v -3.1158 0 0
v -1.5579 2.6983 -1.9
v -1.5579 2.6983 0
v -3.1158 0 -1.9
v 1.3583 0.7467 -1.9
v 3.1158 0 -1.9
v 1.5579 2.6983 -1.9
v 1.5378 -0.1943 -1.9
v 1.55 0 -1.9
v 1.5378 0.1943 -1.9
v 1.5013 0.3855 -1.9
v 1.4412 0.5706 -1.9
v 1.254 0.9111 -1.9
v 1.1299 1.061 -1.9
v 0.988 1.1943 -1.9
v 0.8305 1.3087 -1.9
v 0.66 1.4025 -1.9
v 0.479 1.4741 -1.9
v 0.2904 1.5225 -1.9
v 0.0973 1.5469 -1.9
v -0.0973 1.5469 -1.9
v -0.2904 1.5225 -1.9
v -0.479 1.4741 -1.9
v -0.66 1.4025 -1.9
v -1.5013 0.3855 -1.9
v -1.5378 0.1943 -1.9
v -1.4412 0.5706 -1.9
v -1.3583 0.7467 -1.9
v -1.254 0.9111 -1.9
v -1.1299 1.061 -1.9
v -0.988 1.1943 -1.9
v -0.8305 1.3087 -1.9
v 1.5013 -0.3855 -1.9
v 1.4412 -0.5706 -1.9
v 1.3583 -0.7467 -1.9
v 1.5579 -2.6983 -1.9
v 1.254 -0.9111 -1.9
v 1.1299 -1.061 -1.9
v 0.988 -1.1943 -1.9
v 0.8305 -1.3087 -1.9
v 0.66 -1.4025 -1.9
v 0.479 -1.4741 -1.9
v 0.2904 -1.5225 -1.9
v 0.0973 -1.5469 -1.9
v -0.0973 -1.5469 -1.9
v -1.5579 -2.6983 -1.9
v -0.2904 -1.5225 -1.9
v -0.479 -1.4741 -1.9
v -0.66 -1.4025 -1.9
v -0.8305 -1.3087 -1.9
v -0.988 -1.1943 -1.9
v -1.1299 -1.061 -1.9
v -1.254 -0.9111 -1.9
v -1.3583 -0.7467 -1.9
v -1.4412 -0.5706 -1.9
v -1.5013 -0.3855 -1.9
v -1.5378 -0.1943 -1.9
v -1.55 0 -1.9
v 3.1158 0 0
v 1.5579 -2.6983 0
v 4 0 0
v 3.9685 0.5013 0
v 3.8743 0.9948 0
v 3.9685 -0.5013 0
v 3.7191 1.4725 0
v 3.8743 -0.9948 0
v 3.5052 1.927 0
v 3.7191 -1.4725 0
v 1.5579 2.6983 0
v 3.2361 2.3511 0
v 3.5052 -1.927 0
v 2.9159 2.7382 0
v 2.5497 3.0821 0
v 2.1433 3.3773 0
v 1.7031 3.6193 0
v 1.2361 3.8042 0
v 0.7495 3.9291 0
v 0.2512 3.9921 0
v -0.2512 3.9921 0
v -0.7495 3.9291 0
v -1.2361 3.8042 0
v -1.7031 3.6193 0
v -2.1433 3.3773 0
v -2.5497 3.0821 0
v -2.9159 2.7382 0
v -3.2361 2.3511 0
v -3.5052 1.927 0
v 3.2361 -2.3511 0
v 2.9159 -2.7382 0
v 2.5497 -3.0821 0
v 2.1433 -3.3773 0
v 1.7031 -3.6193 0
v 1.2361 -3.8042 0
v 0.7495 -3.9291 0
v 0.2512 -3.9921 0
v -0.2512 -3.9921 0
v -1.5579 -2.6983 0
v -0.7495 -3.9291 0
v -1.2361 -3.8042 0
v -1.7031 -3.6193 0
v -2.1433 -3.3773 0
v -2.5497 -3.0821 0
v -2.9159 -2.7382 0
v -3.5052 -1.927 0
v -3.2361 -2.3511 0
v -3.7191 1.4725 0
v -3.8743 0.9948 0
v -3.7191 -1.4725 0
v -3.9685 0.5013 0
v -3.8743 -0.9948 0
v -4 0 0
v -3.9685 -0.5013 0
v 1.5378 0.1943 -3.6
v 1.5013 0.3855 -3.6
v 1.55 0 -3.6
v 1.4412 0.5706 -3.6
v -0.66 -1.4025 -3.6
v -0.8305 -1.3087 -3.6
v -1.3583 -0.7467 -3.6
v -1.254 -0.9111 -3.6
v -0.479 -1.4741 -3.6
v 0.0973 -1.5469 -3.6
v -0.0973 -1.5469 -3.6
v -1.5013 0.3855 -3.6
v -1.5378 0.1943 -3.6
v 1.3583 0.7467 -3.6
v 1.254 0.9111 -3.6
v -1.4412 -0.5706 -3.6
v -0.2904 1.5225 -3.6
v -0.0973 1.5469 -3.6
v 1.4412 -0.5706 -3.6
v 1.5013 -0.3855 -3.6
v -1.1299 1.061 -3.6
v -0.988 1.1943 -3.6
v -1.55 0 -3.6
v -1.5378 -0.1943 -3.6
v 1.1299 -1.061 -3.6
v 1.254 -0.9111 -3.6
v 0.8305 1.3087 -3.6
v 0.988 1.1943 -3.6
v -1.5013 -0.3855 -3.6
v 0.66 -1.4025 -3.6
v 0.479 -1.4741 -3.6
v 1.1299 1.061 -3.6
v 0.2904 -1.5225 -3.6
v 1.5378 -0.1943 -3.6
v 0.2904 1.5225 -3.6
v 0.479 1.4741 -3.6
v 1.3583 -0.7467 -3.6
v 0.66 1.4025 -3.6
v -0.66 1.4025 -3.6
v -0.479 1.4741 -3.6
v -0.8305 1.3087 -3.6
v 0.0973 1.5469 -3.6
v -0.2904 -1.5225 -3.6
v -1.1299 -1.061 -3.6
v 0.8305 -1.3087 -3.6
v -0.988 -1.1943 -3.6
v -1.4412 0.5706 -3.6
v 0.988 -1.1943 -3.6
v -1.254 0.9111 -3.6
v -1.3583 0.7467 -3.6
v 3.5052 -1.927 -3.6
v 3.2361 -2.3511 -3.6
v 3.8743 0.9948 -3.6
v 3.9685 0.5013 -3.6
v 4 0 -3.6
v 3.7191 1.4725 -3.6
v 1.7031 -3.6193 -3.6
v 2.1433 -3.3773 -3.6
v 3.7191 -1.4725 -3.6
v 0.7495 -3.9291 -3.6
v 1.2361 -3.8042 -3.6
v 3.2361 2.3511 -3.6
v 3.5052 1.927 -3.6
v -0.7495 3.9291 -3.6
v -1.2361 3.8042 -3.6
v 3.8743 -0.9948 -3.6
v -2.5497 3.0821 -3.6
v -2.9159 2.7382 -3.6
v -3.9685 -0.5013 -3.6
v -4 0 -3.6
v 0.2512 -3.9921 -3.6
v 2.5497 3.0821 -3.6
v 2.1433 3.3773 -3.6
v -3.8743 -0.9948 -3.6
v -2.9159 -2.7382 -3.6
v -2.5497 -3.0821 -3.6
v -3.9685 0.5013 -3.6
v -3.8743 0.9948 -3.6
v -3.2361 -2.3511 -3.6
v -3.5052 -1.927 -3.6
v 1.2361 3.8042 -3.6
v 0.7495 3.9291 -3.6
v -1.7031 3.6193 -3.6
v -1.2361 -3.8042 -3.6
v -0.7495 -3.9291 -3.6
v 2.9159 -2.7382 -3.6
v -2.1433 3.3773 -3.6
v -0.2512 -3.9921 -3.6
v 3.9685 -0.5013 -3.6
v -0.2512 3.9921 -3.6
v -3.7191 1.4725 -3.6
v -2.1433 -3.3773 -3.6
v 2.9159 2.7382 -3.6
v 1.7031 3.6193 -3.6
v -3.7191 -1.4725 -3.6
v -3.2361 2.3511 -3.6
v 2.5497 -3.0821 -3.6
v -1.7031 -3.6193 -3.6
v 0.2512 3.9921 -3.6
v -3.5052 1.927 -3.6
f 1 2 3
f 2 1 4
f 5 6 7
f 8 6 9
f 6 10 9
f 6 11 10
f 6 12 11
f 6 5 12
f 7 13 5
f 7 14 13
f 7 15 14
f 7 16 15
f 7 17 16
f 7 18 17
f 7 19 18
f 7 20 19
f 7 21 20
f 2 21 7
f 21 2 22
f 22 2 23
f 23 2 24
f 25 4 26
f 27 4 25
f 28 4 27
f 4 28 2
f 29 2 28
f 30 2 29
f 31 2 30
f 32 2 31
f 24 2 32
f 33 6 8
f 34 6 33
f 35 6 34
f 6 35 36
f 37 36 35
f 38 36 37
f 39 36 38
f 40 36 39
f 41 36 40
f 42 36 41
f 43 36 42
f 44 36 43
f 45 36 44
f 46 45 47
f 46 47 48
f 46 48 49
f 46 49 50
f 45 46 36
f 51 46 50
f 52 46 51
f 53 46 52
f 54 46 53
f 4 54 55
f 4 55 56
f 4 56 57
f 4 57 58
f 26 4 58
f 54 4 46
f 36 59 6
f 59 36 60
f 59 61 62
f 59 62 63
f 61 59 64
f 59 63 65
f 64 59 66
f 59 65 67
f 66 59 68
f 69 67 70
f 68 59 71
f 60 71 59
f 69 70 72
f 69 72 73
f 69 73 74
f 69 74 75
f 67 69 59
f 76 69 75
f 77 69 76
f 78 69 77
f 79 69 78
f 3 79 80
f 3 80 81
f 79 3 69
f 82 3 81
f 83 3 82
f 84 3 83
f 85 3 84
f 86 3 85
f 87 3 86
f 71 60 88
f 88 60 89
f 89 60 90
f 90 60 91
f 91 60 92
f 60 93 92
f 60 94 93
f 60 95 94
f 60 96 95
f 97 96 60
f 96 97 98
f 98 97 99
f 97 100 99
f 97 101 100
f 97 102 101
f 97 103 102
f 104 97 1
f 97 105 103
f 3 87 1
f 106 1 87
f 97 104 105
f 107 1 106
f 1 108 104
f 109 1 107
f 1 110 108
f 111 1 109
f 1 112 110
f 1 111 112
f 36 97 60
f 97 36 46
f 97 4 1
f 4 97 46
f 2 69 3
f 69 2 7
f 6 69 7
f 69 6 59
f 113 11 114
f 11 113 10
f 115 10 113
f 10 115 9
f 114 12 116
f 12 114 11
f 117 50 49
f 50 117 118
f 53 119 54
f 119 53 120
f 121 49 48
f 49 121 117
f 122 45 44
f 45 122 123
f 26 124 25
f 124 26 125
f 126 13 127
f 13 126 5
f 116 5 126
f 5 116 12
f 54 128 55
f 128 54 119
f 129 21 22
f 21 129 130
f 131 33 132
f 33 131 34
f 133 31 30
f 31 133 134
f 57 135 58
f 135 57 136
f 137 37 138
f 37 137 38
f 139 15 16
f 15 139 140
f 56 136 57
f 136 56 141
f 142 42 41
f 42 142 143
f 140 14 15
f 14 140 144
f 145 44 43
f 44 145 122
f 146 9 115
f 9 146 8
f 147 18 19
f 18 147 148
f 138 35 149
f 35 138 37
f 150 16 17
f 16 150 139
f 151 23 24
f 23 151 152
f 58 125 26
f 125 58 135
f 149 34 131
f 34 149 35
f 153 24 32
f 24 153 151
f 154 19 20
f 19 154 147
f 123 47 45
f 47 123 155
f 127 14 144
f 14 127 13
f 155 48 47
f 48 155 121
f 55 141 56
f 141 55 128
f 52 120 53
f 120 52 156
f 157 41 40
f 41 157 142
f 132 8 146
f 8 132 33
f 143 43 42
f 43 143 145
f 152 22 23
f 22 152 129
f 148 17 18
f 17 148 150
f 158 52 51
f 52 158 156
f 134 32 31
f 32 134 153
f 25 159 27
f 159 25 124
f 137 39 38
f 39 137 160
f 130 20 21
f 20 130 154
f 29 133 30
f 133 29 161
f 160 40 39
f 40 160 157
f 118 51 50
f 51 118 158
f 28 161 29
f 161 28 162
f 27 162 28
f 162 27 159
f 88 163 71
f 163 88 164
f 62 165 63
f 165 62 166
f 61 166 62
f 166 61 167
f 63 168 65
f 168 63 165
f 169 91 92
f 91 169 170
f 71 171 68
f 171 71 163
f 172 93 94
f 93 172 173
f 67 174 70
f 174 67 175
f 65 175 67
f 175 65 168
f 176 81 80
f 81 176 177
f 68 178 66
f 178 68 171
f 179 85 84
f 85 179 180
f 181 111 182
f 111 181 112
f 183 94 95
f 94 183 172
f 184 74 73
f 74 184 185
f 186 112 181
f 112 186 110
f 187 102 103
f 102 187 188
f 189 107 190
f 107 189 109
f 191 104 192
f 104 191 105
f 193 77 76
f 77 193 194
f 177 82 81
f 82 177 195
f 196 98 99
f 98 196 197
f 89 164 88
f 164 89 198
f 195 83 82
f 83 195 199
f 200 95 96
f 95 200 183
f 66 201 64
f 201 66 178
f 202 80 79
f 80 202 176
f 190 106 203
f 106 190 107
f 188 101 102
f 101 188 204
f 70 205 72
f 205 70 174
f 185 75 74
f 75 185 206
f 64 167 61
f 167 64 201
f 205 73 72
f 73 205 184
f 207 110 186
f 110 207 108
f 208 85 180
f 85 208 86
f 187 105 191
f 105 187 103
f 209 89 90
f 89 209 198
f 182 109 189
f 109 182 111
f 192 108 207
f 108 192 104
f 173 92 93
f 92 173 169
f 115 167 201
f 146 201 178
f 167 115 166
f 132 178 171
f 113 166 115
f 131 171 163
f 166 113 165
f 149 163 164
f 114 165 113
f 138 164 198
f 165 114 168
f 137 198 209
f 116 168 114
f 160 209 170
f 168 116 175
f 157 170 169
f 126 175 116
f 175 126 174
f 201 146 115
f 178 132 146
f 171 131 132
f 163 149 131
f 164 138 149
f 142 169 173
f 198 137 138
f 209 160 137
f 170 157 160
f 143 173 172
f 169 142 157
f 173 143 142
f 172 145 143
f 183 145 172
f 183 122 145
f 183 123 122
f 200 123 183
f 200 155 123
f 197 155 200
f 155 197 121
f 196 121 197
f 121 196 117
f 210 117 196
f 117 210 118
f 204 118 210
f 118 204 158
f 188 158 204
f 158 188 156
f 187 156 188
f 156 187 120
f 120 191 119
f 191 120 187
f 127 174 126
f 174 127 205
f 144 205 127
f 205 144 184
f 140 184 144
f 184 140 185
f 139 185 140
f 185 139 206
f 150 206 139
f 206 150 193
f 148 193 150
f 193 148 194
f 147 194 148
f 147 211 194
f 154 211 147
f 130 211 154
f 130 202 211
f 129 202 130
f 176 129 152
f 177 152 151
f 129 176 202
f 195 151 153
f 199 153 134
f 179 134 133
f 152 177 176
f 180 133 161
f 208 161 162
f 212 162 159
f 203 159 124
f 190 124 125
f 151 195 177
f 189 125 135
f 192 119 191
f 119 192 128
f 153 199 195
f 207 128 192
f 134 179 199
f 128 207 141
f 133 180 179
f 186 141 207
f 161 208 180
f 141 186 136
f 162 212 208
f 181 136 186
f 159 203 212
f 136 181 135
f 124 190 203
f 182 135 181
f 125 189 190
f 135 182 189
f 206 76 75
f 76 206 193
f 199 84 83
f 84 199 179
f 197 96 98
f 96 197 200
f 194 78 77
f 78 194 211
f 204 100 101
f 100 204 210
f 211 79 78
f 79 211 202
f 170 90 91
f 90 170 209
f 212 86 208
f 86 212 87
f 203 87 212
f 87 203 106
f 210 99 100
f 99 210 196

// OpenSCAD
$fn = 50;

difference() {
	union() {
		translate(v = [0, 0, -3.5999999999999996]) {
			cylinder(h = 6.6, r = 4.0);
		}
	}
	union() {
		translate(v = [0, 0, 0]) {
			rotate(a = [0, 0, 0]) {
				difference() {
					union() {
						translate(v = [0, 0, -1.9]) {
							linear_extrude(height = 1.9) {
								polygon(points = [[3.1158, 0.0], [1.5579000000000005, 2.698361953111554], [-1.5578999999999994, 2.6983619531115544], [-3.1158, 3.815754496783323e-16], [-1.5579000000000014, -2.6983619531115535], [1.557899999999998, -2.6983619531115552]]);
							}
						}
					}
					union();
				}
			}
		}
		#cylinder(h = 3, r = 5.0);
		#translate(v = [0, 0, -100.0]) {
			cylinder(h = 200, r = 1.55);
		}
	}
}
